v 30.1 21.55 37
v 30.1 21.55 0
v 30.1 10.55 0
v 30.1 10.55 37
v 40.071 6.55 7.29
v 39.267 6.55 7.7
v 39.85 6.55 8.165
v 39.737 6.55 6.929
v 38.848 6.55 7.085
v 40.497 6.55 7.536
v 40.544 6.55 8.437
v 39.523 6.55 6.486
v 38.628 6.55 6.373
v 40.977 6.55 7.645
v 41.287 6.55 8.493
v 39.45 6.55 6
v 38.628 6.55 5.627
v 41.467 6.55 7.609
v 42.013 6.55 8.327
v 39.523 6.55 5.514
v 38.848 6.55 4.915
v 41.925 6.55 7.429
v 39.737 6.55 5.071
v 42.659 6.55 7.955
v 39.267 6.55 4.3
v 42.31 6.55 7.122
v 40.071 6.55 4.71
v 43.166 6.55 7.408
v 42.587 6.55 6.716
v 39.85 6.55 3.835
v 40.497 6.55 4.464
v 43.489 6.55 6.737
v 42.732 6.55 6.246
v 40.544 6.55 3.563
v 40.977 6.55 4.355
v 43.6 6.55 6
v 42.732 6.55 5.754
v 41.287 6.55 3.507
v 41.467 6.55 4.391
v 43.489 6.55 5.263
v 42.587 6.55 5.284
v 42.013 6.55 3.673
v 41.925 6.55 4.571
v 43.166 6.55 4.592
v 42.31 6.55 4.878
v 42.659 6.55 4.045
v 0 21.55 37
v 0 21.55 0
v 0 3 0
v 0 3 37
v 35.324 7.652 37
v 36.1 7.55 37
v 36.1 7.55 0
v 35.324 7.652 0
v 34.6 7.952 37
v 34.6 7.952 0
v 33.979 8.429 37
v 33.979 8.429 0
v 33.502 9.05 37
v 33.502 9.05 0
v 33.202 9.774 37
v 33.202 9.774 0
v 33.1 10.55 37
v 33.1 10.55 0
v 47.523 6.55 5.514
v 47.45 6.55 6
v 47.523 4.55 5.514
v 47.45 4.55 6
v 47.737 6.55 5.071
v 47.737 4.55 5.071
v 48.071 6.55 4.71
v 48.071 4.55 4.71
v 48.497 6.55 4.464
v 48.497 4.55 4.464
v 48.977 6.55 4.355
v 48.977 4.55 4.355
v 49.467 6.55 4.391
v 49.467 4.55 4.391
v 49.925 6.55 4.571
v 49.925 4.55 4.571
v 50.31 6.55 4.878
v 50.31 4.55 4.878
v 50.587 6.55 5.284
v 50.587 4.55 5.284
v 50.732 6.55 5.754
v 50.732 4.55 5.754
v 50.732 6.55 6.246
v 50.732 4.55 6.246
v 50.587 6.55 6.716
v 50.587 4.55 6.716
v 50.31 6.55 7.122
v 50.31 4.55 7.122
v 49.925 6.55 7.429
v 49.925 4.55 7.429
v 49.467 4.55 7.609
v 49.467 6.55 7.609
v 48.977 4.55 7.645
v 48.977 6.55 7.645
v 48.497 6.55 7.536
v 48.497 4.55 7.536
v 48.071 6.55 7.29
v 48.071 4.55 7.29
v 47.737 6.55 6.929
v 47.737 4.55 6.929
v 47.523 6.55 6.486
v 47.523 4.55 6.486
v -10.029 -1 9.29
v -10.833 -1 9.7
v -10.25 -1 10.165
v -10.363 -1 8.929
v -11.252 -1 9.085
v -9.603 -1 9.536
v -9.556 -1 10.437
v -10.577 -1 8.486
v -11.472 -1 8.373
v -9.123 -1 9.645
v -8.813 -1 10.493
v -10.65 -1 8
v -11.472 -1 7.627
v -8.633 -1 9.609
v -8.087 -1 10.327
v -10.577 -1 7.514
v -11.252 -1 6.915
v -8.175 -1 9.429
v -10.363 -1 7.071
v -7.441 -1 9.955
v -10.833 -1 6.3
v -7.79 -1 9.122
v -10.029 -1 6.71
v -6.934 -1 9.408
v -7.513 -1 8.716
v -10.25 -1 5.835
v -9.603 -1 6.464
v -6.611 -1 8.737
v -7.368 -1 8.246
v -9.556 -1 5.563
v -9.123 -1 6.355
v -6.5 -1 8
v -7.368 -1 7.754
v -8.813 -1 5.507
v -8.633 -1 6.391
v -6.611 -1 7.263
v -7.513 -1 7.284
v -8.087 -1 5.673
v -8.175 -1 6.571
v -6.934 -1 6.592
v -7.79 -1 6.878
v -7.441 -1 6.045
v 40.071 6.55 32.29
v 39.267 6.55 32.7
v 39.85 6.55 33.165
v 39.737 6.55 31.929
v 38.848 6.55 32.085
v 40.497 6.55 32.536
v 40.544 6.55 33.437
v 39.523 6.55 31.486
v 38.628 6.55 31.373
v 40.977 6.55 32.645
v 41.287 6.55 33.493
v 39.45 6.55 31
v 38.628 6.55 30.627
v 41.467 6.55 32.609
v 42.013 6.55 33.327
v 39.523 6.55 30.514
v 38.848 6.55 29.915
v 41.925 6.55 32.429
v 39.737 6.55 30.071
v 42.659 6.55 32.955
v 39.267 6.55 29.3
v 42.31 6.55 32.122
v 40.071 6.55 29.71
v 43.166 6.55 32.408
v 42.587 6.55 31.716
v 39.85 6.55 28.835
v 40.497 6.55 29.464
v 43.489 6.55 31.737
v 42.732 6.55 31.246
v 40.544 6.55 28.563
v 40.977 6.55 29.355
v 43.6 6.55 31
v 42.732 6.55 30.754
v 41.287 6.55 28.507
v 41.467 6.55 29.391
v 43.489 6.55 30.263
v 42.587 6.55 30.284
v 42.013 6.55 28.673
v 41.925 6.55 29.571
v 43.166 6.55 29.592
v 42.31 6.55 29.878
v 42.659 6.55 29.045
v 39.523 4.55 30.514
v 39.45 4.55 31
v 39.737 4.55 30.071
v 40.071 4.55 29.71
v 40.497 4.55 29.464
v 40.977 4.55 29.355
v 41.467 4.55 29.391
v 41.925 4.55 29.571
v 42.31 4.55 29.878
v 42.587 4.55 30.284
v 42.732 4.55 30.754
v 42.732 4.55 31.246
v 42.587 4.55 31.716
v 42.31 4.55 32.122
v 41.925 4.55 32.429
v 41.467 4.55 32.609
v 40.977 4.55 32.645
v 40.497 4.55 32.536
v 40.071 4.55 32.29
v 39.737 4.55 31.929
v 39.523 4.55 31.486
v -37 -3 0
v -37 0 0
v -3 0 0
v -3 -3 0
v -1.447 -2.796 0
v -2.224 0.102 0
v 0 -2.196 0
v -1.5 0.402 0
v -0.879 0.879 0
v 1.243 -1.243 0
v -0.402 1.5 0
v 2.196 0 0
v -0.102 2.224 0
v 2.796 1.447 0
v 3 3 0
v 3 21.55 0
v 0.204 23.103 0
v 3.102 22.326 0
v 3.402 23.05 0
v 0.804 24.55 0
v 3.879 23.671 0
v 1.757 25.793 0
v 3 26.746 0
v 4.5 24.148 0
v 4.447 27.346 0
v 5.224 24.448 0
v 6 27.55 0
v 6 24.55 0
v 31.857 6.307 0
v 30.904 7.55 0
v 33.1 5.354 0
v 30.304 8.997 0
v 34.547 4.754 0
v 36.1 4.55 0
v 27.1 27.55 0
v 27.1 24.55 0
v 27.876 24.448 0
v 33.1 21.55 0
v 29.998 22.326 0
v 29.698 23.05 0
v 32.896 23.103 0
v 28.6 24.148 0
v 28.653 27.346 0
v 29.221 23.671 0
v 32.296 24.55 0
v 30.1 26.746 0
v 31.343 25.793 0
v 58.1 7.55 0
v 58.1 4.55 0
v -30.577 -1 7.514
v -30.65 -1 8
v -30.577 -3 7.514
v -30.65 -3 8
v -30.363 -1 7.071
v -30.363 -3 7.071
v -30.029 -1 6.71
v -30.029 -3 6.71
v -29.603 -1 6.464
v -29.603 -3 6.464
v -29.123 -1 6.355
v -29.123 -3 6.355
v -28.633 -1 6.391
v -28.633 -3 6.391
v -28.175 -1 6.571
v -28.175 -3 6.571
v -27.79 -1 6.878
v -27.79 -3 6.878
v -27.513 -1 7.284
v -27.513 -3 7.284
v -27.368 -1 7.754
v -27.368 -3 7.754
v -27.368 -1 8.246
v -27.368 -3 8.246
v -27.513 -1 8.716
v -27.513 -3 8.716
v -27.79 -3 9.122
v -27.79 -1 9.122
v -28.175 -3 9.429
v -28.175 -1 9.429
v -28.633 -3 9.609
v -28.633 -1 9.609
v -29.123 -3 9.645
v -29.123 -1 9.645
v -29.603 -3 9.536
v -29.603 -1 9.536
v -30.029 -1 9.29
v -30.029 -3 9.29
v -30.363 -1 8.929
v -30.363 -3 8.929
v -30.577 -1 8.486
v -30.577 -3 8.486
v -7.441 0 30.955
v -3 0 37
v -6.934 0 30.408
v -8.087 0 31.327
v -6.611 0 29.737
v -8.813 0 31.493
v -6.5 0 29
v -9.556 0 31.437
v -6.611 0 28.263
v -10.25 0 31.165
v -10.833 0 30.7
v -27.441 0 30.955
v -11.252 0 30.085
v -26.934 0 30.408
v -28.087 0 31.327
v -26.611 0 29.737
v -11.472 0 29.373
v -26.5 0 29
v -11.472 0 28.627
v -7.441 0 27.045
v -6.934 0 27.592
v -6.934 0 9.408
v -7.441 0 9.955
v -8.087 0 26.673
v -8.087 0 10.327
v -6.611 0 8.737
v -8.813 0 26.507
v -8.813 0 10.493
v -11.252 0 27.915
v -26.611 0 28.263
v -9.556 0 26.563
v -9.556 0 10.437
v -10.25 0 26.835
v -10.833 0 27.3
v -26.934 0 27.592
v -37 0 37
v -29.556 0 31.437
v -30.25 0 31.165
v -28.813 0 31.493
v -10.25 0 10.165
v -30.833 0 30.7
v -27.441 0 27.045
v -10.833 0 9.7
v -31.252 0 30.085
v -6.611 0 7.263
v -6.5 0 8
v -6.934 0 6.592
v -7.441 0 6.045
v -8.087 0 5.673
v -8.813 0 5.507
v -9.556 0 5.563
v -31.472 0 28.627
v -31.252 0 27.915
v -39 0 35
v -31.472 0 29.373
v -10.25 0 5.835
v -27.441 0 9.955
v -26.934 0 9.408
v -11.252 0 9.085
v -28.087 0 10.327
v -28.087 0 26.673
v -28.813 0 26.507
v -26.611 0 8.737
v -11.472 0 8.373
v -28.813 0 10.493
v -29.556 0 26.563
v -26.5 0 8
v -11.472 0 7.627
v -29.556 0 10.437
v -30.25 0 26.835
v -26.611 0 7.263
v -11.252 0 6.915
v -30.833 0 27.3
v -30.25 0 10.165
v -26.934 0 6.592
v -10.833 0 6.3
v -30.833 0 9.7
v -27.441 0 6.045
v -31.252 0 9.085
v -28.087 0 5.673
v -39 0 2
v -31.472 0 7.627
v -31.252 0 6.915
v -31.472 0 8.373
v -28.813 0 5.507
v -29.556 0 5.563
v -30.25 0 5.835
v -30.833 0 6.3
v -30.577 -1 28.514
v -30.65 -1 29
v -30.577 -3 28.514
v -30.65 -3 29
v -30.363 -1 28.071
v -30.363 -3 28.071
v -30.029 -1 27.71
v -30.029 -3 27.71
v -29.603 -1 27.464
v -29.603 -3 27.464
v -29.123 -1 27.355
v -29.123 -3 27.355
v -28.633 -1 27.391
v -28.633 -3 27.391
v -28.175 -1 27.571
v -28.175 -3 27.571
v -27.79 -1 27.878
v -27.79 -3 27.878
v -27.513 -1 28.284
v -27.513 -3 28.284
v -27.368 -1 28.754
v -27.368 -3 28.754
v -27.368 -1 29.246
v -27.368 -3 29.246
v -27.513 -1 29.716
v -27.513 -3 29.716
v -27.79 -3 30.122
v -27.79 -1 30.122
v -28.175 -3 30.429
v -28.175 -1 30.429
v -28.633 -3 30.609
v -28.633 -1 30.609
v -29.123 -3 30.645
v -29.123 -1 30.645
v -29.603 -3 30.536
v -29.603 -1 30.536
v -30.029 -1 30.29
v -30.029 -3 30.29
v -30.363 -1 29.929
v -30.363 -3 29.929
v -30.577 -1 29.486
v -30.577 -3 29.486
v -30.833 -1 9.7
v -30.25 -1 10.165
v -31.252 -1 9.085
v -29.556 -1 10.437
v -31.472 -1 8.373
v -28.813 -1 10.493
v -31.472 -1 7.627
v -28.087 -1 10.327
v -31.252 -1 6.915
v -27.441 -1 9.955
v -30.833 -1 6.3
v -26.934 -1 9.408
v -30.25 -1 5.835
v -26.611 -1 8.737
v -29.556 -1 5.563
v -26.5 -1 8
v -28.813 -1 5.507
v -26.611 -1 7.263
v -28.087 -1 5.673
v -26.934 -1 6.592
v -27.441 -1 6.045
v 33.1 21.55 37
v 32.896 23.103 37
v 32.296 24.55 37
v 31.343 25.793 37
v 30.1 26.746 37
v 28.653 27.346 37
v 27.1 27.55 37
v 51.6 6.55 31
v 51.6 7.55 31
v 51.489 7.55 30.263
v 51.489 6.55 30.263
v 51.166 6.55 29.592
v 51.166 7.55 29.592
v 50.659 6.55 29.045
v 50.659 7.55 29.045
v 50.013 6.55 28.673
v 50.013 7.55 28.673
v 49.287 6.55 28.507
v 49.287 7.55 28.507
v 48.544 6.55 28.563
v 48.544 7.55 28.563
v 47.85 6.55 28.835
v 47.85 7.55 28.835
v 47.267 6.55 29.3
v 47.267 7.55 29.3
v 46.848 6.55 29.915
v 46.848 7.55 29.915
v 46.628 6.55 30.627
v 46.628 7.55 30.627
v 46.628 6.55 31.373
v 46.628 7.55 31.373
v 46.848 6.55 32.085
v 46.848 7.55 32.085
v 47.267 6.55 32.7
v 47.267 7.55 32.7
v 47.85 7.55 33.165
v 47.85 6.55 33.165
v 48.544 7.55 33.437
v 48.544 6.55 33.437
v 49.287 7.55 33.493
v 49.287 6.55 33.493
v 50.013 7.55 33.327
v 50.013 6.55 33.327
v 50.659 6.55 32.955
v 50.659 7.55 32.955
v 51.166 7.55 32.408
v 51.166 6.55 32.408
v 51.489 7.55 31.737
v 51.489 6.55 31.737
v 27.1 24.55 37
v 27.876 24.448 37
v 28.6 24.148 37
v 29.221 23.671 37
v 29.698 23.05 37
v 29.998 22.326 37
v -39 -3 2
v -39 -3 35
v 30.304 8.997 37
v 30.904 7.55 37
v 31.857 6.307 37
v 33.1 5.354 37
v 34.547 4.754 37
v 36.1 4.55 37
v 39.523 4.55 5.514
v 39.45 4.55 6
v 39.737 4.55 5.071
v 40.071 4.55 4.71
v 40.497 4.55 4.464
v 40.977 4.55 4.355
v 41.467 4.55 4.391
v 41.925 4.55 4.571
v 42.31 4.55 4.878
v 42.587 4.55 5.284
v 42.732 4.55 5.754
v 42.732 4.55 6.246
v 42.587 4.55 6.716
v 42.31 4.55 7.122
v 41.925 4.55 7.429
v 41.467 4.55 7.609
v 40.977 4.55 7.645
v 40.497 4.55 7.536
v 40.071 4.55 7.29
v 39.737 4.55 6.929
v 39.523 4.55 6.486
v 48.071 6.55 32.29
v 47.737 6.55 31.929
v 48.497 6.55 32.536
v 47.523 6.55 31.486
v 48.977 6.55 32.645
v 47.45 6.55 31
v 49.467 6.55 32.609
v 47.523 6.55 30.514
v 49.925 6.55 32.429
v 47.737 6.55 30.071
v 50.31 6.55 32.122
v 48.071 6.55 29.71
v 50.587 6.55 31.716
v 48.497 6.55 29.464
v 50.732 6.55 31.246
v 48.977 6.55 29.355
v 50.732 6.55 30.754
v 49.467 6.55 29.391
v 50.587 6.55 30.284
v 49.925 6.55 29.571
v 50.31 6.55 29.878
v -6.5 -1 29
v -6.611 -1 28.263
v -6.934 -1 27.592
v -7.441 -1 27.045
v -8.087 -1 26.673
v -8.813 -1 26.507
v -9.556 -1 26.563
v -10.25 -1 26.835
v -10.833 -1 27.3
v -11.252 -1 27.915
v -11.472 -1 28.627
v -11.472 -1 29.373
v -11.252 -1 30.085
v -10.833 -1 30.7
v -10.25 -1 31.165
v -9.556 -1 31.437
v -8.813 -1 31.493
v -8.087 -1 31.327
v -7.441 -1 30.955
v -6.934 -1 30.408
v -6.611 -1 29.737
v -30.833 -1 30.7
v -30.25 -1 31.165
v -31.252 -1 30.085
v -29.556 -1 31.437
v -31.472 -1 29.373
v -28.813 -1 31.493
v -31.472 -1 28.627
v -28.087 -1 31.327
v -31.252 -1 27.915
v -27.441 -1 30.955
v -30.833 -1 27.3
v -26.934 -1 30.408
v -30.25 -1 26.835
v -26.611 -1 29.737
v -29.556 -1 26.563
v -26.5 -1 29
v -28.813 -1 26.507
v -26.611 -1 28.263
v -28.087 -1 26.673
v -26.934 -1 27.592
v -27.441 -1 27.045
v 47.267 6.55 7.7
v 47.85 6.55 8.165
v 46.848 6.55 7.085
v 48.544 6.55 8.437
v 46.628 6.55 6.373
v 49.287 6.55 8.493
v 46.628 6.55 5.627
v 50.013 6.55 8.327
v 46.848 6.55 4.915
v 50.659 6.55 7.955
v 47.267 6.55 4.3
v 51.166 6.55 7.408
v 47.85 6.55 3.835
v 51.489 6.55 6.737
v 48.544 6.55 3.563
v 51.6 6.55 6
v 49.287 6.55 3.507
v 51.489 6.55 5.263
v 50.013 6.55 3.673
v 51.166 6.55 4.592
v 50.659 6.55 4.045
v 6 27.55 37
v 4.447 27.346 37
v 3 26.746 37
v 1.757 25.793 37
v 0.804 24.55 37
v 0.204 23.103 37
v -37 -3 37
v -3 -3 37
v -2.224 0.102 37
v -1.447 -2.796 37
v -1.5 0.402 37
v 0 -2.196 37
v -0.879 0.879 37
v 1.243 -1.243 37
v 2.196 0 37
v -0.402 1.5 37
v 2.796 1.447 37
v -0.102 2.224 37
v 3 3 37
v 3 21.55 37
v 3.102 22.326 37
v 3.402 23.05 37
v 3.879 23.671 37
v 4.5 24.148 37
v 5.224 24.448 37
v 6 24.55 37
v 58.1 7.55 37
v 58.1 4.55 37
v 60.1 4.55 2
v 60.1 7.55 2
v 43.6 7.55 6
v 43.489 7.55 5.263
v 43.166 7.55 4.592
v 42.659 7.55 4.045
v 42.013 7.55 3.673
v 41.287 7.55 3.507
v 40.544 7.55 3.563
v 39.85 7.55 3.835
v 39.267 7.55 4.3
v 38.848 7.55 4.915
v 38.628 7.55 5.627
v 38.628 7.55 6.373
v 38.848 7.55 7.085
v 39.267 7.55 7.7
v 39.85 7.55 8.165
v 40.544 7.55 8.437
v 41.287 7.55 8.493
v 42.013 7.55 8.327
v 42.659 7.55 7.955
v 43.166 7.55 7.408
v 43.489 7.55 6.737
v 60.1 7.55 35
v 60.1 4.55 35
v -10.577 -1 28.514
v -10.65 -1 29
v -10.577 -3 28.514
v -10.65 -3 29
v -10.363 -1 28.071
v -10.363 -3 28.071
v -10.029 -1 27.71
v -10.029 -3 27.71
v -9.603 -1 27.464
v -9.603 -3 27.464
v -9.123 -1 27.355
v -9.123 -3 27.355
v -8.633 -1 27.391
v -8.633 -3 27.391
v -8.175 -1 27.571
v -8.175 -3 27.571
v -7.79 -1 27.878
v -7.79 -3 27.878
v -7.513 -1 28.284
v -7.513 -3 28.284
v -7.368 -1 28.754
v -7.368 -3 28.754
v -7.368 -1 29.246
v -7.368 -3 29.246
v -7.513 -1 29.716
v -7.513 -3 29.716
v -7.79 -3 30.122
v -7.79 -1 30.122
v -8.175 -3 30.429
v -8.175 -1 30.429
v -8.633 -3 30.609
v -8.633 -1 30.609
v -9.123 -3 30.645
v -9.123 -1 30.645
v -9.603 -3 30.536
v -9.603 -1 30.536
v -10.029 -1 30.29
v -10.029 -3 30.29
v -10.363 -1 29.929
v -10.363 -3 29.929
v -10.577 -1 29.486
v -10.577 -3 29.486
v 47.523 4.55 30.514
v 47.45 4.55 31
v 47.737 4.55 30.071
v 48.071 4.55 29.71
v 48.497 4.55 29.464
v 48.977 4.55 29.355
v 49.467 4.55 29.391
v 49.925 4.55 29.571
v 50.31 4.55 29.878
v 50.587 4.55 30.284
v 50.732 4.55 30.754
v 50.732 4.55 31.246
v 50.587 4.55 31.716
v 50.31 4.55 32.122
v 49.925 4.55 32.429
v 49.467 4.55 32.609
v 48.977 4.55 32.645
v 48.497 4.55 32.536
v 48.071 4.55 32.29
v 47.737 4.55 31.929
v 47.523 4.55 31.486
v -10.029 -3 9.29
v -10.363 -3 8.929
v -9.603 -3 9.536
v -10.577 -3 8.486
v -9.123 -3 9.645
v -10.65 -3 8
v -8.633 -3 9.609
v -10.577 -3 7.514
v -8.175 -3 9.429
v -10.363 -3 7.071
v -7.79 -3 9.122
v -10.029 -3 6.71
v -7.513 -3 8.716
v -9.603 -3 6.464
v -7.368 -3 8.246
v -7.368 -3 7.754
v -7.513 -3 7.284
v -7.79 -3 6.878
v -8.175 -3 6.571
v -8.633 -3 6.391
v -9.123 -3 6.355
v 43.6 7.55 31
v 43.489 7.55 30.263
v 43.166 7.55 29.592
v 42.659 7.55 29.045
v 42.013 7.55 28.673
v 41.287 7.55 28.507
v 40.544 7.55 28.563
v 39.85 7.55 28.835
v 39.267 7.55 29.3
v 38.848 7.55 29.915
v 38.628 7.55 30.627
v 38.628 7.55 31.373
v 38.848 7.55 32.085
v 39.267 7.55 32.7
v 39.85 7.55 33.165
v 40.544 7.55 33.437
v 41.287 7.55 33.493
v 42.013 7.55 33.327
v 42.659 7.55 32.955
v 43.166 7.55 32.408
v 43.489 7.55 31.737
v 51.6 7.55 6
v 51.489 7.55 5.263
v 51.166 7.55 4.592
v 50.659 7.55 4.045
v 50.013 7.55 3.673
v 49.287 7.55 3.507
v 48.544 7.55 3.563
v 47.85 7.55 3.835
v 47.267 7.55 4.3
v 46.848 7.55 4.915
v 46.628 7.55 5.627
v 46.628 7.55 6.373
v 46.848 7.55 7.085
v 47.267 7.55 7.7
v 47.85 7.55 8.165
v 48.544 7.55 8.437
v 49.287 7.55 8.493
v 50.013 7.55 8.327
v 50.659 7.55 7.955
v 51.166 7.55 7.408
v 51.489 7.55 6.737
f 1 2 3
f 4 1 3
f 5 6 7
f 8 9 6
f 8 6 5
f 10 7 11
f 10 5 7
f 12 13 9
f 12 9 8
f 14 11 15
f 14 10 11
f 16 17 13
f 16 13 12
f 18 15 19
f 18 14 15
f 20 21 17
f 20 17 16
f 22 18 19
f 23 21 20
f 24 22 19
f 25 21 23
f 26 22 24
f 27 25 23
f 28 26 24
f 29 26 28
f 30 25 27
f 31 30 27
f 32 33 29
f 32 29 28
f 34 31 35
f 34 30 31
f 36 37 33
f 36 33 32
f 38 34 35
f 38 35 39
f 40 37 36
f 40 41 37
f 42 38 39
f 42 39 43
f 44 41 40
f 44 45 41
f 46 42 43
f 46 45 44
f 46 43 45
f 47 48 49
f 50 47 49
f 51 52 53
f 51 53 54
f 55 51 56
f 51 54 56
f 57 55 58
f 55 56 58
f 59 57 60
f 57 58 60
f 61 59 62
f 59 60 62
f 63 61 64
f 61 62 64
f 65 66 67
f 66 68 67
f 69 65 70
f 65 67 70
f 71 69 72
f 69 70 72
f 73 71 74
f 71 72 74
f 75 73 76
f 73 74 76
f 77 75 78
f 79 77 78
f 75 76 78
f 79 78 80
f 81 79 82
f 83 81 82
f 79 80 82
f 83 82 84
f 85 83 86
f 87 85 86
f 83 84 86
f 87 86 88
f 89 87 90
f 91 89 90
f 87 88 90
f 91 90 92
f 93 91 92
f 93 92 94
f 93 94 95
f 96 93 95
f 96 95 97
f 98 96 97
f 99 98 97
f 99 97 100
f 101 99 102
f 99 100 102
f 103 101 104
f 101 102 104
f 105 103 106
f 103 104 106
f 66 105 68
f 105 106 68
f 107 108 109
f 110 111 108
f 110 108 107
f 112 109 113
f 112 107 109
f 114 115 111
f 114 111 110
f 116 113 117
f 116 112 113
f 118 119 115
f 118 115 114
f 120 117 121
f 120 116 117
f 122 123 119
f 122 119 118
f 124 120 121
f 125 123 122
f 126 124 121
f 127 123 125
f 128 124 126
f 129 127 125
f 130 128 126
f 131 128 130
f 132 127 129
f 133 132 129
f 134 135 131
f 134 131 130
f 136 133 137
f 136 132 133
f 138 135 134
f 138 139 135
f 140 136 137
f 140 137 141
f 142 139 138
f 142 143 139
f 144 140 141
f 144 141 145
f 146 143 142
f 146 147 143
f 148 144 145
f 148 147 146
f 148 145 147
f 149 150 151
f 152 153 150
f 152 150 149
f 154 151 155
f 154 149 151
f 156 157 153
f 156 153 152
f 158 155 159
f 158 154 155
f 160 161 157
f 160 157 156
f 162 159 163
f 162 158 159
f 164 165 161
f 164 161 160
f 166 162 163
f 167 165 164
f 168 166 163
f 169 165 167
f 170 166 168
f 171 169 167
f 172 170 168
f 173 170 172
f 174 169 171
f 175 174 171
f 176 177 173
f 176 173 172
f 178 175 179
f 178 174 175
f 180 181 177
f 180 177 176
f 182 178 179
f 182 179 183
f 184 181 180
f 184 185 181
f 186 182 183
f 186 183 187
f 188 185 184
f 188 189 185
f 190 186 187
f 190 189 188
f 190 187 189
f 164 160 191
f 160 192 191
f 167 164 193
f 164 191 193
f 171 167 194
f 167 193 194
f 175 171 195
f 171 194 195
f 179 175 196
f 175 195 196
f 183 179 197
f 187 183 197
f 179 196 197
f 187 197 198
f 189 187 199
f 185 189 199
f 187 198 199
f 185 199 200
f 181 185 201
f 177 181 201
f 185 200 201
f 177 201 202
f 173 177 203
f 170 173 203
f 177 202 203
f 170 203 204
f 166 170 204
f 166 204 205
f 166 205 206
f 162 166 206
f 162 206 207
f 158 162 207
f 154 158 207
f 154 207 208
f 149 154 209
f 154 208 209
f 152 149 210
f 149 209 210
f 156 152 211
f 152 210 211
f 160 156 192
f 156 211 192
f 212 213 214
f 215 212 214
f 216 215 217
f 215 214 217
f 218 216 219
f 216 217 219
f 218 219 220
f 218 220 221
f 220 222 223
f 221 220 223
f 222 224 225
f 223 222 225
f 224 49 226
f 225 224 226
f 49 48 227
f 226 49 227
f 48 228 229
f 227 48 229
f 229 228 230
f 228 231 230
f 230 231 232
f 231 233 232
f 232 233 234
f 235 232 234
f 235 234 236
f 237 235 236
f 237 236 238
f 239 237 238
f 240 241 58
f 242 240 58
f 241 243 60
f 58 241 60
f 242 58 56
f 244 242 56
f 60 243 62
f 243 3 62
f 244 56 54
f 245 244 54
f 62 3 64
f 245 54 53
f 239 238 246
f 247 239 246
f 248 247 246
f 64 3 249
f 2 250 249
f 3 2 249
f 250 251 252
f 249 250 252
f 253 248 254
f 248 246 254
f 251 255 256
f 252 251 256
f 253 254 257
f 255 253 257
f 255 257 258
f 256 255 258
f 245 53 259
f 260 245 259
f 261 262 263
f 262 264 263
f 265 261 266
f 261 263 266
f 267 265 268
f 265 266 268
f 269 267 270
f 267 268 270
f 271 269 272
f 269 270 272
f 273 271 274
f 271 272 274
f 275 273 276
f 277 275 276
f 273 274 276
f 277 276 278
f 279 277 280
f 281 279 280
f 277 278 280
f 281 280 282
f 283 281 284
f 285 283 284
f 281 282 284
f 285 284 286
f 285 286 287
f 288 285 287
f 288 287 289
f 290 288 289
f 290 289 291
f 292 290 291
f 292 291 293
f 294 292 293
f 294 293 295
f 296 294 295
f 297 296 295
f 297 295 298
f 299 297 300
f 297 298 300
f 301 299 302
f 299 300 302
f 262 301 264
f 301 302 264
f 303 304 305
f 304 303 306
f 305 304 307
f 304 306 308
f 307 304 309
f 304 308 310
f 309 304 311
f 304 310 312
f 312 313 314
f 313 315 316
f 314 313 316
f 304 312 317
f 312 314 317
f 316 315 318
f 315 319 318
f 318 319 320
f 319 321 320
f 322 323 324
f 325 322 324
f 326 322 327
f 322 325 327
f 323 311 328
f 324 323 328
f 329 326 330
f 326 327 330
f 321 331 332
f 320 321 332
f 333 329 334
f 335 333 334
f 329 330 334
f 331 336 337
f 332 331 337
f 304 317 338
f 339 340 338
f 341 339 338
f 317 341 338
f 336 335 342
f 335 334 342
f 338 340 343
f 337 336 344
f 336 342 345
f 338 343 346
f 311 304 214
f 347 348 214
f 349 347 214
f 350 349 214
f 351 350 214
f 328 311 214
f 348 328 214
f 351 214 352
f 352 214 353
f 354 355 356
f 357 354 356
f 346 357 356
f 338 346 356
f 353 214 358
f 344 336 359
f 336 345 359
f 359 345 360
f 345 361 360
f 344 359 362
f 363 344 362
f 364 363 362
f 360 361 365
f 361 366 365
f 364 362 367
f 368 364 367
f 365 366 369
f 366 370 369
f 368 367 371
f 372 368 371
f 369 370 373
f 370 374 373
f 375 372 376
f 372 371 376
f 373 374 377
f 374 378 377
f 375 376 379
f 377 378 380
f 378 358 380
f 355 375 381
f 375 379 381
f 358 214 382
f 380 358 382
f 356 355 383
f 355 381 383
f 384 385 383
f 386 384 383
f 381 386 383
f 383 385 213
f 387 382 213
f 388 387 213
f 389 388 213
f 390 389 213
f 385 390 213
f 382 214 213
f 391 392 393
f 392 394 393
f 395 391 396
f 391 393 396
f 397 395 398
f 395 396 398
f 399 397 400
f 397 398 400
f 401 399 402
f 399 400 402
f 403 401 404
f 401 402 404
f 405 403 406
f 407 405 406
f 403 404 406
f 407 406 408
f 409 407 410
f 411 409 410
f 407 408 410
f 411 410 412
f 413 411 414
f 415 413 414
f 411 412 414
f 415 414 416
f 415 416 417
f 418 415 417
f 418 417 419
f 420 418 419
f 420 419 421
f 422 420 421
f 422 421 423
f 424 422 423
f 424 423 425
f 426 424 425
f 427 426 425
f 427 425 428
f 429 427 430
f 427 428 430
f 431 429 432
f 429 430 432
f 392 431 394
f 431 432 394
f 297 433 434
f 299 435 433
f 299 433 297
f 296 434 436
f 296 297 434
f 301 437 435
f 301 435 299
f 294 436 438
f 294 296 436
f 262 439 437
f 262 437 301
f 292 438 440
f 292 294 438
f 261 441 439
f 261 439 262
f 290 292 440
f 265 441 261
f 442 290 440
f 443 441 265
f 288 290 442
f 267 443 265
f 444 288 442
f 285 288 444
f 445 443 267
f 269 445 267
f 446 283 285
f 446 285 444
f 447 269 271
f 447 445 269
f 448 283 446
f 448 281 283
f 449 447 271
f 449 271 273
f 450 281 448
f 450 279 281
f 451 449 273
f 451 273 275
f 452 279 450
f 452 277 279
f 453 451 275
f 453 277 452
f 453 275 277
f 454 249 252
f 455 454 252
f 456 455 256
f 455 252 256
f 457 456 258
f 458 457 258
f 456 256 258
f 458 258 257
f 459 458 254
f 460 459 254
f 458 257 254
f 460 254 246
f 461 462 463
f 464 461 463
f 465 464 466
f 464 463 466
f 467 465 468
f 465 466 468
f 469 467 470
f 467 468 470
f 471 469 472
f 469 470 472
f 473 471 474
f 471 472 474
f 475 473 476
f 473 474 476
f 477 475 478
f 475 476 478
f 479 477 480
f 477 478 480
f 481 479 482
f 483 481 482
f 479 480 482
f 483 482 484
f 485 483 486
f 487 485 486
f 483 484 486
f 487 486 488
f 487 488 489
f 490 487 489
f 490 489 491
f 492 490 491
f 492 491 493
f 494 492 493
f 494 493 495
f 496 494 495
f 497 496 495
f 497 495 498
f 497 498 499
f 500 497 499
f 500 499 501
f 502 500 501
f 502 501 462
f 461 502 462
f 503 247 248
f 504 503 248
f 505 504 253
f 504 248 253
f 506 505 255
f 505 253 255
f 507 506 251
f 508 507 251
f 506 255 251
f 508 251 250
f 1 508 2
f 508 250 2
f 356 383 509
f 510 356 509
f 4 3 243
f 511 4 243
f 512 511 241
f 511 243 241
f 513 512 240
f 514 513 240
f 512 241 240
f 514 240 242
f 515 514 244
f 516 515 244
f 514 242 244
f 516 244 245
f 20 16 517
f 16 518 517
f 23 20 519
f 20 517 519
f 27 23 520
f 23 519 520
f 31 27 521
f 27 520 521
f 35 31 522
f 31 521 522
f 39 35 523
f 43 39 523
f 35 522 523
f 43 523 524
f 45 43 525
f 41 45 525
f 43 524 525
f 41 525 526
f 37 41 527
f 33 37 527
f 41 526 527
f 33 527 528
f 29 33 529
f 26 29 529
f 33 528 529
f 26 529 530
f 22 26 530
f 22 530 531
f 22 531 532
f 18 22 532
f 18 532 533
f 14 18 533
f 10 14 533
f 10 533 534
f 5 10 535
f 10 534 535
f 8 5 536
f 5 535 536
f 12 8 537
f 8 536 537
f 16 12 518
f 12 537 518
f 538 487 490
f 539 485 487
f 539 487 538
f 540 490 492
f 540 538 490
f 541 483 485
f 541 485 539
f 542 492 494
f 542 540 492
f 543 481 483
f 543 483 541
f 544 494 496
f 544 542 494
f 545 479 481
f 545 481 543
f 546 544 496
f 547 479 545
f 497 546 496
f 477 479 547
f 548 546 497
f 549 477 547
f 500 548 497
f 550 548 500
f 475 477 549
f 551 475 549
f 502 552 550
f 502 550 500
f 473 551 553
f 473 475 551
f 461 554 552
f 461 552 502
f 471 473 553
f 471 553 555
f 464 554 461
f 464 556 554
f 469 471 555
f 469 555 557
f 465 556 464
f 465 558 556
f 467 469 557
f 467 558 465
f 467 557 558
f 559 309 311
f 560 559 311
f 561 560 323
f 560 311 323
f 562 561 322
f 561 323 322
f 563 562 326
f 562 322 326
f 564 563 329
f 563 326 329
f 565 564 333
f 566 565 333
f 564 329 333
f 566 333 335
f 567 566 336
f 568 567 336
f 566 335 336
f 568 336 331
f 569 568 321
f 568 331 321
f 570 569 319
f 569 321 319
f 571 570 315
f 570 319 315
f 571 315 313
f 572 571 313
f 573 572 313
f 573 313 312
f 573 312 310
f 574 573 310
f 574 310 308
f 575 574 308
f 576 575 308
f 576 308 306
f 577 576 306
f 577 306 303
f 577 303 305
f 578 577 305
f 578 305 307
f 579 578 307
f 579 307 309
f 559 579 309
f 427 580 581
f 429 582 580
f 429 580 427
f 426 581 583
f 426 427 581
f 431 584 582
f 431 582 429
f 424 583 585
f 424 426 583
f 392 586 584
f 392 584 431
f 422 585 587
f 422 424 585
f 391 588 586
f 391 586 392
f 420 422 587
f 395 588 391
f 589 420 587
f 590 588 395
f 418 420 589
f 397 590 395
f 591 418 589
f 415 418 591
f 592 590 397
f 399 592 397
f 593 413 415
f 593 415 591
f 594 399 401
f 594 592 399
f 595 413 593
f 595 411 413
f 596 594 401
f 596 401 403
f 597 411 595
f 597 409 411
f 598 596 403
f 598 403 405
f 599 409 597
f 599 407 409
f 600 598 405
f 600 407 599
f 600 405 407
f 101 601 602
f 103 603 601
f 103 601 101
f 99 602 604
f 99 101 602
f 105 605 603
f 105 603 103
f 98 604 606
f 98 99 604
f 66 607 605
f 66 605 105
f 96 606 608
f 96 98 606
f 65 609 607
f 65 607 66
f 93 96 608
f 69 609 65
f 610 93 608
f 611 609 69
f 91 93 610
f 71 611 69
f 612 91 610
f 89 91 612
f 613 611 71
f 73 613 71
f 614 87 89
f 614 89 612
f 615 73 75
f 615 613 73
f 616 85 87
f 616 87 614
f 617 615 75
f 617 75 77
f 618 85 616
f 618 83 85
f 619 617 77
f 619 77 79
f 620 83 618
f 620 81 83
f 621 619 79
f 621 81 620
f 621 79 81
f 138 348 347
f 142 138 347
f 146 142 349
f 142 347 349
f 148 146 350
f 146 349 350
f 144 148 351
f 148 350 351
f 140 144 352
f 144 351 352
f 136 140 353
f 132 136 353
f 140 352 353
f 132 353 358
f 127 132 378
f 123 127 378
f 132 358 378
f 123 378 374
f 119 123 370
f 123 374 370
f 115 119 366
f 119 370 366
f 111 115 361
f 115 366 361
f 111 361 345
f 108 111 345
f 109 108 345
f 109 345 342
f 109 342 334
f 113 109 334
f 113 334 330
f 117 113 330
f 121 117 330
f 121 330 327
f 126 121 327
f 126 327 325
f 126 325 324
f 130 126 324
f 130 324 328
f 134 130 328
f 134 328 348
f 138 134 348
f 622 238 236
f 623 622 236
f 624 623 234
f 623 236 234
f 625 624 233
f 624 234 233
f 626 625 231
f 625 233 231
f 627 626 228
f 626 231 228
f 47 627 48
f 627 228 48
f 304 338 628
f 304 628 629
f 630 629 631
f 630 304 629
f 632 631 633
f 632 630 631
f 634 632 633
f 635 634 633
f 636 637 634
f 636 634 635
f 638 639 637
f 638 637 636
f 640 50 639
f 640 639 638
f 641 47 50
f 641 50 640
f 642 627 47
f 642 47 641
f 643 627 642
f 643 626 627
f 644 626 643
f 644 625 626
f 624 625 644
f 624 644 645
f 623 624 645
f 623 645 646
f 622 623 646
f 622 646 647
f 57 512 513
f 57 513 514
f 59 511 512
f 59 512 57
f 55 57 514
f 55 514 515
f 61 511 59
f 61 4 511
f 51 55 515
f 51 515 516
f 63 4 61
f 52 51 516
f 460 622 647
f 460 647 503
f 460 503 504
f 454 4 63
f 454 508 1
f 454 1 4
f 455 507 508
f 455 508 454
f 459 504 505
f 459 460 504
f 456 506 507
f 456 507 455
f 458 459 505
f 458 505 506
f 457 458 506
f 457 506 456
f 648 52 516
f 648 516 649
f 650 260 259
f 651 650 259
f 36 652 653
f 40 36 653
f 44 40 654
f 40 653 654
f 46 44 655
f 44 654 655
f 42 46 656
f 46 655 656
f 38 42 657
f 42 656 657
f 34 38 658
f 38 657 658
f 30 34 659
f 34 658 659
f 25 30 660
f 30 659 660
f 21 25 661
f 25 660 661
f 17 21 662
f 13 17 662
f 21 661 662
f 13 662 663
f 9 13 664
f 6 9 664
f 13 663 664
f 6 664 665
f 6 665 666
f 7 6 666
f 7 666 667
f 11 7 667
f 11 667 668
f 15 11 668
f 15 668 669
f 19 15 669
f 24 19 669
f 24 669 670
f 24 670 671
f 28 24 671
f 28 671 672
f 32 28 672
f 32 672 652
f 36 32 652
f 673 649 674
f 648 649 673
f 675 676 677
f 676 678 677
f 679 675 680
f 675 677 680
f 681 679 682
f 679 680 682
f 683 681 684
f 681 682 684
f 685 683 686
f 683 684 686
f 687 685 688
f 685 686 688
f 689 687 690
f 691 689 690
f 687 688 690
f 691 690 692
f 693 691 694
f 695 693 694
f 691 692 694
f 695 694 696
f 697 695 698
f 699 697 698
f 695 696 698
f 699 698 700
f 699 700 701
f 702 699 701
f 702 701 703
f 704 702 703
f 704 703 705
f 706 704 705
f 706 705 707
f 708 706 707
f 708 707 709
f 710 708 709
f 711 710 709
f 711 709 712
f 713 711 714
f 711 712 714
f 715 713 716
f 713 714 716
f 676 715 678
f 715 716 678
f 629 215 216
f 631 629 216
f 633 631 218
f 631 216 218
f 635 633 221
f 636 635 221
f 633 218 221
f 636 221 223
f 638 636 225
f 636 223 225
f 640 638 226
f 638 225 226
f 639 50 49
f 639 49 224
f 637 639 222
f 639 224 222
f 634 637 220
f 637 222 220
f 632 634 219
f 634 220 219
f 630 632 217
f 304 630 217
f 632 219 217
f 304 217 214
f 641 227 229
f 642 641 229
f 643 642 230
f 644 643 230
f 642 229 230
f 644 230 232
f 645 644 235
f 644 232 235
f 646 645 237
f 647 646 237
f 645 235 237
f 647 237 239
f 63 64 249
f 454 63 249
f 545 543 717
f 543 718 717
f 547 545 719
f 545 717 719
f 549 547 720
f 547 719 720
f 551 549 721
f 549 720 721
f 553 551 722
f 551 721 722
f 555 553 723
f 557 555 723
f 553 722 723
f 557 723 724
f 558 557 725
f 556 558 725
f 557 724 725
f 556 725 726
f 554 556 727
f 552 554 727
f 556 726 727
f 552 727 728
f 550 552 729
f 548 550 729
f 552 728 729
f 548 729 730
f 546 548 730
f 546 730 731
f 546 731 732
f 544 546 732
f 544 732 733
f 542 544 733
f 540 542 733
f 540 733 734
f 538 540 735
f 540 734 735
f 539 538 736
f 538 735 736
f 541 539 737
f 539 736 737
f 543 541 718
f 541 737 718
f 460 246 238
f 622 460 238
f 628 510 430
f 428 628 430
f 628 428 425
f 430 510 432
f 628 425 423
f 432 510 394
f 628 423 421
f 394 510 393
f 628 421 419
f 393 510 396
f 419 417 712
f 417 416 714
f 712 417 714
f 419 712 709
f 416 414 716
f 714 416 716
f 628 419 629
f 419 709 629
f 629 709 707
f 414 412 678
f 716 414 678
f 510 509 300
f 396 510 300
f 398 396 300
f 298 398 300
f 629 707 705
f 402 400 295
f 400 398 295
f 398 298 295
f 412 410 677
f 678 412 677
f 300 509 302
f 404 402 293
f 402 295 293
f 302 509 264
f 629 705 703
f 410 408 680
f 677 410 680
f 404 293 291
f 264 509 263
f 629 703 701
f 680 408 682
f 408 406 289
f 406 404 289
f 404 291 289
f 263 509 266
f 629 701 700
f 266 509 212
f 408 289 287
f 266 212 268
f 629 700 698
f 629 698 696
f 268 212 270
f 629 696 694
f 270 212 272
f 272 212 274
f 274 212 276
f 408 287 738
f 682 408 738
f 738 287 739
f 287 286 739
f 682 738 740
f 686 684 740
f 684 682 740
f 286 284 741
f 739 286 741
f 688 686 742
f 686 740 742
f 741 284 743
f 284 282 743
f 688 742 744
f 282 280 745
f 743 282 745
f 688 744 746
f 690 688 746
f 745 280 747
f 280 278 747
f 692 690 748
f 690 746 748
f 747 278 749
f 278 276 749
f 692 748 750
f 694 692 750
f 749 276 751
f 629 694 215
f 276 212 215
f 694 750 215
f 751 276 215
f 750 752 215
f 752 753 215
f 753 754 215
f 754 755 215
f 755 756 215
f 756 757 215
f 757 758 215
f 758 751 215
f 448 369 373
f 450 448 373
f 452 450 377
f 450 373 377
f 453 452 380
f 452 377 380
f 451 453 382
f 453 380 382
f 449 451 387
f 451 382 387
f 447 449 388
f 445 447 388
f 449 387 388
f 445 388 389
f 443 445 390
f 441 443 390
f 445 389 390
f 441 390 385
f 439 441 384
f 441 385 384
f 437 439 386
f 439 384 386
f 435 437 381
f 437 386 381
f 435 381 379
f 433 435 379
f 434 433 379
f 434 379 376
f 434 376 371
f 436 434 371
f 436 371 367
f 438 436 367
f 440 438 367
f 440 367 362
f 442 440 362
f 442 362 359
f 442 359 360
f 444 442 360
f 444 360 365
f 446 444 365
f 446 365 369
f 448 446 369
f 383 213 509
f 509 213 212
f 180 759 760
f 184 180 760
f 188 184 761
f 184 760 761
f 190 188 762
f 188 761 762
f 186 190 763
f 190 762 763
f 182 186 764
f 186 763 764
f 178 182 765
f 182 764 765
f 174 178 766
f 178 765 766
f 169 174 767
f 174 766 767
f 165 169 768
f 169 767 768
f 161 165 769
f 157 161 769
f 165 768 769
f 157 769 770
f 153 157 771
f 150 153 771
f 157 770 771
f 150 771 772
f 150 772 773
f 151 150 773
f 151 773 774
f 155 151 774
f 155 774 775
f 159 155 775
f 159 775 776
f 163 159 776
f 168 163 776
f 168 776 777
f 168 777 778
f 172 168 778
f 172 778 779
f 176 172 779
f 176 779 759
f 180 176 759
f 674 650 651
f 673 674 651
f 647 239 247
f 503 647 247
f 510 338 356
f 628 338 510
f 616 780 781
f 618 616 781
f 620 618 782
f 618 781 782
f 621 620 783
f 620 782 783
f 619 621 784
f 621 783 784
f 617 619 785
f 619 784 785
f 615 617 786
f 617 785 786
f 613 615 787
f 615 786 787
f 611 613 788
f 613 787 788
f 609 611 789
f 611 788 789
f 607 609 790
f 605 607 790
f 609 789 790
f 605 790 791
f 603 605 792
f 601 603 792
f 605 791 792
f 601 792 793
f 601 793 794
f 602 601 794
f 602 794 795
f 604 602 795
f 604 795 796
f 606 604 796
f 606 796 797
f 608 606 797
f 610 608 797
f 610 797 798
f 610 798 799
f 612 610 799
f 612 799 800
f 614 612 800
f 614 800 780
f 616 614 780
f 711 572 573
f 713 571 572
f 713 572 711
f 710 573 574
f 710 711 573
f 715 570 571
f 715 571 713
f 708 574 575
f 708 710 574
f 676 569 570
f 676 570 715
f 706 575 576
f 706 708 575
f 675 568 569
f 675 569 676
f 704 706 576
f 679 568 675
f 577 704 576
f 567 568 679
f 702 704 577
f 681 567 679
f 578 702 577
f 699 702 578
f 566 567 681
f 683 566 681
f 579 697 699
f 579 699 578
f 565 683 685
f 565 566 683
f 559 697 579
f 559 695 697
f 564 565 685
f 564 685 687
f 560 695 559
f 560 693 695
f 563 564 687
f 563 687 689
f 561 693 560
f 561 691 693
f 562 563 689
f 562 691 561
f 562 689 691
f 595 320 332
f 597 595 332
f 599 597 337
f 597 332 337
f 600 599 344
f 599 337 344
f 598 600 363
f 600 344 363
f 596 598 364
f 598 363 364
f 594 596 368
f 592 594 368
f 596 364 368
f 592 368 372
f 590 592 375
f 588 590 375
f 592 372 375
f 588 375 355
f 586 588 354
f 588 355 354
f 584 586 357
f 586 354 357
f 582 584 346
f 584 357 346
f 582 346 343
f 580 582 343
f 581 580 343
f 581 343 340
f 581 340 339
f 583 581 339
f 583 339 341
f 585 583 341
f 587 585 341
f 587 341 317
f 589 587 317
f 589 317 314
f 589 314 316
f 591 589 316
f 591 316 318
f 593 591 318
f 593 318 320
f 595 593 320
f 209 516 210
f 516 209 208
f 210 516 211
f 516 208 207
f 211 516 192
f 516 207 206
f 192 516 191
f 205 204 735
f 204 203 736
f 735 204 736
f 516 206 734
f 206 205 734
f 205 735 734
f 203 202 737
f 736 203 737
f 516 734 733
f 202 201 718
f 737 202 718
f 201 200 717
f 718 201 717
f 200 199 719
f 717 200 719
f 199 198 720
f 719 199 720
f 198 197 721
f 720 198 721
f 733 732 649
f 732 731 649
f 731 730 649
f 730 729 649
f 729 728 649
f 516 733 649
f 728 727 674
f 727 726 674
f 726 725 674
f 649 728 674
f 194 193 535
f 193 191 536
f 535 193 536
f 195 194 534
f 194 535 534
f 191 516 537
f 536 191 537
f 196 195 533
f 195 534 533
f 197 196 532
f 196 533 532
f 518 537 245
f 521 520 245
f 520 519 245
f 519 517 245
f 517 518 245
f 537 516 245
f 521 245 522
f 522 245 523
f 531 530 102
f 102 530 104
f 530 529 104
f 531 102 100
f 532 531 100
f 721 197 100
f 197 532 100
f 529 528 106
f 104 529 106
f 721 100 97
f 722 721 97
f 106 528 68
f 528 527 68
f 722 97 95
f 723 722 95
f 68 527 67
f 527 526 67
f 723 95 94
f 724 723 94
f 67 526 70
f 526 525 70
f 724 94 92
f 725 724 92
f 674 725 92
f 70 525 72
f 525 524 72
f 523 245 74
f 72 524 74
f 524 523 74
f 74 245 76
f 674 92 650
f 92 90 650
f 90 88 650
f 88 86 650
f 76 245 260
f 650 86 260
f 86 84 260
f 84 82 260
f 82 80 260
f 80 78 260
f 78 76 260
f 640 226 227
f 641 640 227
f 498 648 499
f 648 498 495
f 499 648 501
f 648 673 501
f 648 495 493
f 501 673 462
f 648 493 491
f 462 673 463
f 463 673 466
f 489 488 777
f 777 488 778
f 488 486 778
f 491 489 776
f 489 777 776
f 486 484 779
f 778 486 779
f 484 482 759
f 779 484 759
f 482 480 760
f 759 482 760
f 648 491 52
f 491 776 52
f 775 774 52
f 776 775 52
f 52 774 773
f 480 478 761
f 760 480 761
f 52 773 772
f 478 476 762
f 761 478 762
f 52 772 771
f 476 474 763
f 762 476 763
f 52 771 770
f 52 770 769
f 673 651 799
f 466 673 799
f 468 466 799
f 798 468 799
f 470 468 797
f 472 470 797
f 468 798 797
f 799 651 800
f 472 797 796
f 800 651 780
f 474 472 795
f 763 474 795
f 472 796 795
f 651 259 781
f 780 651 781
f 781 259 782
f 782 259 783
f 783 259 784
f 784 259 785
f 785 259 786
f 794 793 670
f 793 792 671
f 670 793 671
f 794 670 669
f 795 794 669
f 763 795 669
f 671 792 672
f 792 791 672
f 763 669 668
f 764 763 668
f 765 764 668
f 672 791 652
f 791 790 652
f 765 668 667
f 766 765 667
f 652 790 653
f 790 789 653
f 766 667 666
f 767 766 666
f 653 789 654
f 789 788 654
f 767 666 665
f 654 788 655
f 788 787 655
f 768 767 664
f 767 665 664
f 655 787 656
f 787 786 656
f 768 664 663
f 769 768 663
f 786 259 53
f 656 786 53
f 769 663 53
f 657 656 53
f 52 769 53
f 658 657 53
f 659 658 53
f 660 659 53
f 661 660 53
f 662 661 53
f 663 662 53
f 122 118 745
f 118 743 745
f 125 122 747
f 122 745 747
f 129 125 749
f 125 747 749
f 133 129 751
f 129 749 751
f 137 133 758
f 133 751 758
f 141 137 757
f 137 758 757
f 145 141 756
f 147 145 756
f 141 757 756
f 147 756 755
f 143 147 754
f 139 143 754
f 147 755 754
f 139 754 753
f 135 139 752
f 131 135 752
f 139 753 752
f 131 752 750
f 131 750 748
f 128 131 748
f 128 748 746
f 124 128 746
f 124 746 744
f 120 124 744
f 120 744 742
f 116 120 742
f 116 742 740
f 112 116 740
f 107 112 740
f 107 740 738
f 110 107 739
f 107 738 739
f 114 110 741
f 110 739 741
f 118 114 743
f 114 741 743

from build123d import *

# Parameters (mm, degrees)
SM_BASE_FLANGE_1_DEPTH    = 37
CHAMFER_1_SIZE            = 2
HOLE_WIZARD_1_D           = 3.3
HOLE_WIZARD_1_DEPTH       = 3
HOLE_WIZARD_1_CBORE_D     = 5
HOLE_WIZARD_1_CBORE_DEPTH = 1
HOLE_WIZARD_1_TIP         = 0.991420021
HOLE_WIZARD_2_D           = 3.3
HOLE_WIZARD_2_DEPTH       = 3
HOLE_WIZARD_2_CBORE_D     = 5
HOLE_WIZARD_2_CBORE_DEPTH = 1
HOLE_WIZARD_2_TIP         = 0.991420021


# Sheet-metal steps are written as plain solids
with BuildPart() as part:
    # Sketch 1 → 基体-法兰1 (new body)
    with BuildSketch(Plane.XY):
        with BuildLine():
            Line((60.1, 7.55), (36.1, 7.55))
            ThreePointArc((36.1, 7.55), (33.978679656, 8.428679656), (33.1, 10.55))
            Line((33.1, 10.55), (33.1, 21.55))
            ThreePointArc((33.1, 21.55), (31.342640687, 25.792640687), (27.1, 27.55))
            Line((27.1, 27.55), (6, 27.55))
            ThreePointArc((6, 27.55), (1.757359313, 25.792640687), (0, 21.55))
            Line((0, 21.55), (0, 3))
            ThreePointArc((0, 3), (-0.878679656, 0.878679656), (-3, 0))
            Line((-3, 0), (-39, 0))
            Line((-39, 0), (-39, -3))
            Line((-39, -3), (-3, -3))
            ThreePointArc((-3, -3), (1.242640687, -1.242640687), (3, 3))
            Line((3, 3), (3, 21.55))
            ThreePointArc((3, 21.55), (3.878679656, 23.671320344), (6, 24.55))
            Line((6, 24.55), (27.1, 24.55))
            ThreePointArc((27.1, 24.55), (29.221320344, 23.671320344), (30.1, 21.55))
            Line((30.1, 21.55), (30.1, 10.55))
            ThreePointArc((30.1, 10.55), (31.857359313, 6.307359313), (36.1, 4.55))
            Line((36.1, 4.55), (60.1, 4.55))
            Line((60.1, 4.55), (60.1, 7.55))
        make_face()
    extrude(amount=SM_BASE_FLANGE_1_DEPTH)

    # 倒角1
    chamfer_1_edges = [part.edges().sort_by_distance(p)[0] for p in [
        (-39, -1.5, 0),
        (60.1, 6.05, 0),
        (-39, -1.5, 37),
        (60.1, 6.05, 37),
    ]]
    chamfer(chamfer_1_edges, length=CHAMFER_1_SIZE)

    # 打孔尺寸(%根据)内六角圆柱头螺钉的类型1
    with Locations(Plane(origin=(0, 7.55, 0), x_dir=(1, 0, 0), z_dir=(0, 1, 0))):
        with Locations((49.1, -6), (49.1, -31), (41.1, -31), (41.1, -6)):
            CounterBoreHole(HOLE_WIZARD_1_D / 2, HOLE_WIZARD_1_CBORE_D / 2, HOLE_WIZARD_1_CBORE_DEPTH, depth=HOLE_WIZARD_1_DEPTH)
            with Locations((0, 0, -(HOLE_WIZARD_1_DEPTH + HOLE_WIZARD_1_TIP / 2))):  # 118° drill point
                Cone(0, HOLE_WIZARD_1_D / 2, HOLE_WIZARD_1_TIP, mode=Mode.SUBTRACT)

    # 打孔尺寸(%根据)内六角圆柱头螺钉的类型2
    with Locations(Plane(origin=(0, 0, 0), x_dir=(1, 0, 0), z_dir=(0, 1, 0))):
        with Locations((-29, -8), (-9, -8), (-9, -29), (-29, -29)):
            CounterBoreHole(HOLE_WIZARD_2_D / 2, HOLE_WIZARD_2_CBORE_D / 2, HOLE_WIZARD_2_CBORE_DEPTH, depth=HOLE_WIZARD_2_DEPTH)
            with Locations((0, 0, -(HOLE_WIZARD_2_DEPTH + HOLE_WIZARD_2_TIP / 2))):  # 118° drill point
                Cone(0, HOLE_WIZARD_2_D / 2, HOLE_WIZARD_2_TIP, mode=Mode.SUBTRACT)


solid = part.part
